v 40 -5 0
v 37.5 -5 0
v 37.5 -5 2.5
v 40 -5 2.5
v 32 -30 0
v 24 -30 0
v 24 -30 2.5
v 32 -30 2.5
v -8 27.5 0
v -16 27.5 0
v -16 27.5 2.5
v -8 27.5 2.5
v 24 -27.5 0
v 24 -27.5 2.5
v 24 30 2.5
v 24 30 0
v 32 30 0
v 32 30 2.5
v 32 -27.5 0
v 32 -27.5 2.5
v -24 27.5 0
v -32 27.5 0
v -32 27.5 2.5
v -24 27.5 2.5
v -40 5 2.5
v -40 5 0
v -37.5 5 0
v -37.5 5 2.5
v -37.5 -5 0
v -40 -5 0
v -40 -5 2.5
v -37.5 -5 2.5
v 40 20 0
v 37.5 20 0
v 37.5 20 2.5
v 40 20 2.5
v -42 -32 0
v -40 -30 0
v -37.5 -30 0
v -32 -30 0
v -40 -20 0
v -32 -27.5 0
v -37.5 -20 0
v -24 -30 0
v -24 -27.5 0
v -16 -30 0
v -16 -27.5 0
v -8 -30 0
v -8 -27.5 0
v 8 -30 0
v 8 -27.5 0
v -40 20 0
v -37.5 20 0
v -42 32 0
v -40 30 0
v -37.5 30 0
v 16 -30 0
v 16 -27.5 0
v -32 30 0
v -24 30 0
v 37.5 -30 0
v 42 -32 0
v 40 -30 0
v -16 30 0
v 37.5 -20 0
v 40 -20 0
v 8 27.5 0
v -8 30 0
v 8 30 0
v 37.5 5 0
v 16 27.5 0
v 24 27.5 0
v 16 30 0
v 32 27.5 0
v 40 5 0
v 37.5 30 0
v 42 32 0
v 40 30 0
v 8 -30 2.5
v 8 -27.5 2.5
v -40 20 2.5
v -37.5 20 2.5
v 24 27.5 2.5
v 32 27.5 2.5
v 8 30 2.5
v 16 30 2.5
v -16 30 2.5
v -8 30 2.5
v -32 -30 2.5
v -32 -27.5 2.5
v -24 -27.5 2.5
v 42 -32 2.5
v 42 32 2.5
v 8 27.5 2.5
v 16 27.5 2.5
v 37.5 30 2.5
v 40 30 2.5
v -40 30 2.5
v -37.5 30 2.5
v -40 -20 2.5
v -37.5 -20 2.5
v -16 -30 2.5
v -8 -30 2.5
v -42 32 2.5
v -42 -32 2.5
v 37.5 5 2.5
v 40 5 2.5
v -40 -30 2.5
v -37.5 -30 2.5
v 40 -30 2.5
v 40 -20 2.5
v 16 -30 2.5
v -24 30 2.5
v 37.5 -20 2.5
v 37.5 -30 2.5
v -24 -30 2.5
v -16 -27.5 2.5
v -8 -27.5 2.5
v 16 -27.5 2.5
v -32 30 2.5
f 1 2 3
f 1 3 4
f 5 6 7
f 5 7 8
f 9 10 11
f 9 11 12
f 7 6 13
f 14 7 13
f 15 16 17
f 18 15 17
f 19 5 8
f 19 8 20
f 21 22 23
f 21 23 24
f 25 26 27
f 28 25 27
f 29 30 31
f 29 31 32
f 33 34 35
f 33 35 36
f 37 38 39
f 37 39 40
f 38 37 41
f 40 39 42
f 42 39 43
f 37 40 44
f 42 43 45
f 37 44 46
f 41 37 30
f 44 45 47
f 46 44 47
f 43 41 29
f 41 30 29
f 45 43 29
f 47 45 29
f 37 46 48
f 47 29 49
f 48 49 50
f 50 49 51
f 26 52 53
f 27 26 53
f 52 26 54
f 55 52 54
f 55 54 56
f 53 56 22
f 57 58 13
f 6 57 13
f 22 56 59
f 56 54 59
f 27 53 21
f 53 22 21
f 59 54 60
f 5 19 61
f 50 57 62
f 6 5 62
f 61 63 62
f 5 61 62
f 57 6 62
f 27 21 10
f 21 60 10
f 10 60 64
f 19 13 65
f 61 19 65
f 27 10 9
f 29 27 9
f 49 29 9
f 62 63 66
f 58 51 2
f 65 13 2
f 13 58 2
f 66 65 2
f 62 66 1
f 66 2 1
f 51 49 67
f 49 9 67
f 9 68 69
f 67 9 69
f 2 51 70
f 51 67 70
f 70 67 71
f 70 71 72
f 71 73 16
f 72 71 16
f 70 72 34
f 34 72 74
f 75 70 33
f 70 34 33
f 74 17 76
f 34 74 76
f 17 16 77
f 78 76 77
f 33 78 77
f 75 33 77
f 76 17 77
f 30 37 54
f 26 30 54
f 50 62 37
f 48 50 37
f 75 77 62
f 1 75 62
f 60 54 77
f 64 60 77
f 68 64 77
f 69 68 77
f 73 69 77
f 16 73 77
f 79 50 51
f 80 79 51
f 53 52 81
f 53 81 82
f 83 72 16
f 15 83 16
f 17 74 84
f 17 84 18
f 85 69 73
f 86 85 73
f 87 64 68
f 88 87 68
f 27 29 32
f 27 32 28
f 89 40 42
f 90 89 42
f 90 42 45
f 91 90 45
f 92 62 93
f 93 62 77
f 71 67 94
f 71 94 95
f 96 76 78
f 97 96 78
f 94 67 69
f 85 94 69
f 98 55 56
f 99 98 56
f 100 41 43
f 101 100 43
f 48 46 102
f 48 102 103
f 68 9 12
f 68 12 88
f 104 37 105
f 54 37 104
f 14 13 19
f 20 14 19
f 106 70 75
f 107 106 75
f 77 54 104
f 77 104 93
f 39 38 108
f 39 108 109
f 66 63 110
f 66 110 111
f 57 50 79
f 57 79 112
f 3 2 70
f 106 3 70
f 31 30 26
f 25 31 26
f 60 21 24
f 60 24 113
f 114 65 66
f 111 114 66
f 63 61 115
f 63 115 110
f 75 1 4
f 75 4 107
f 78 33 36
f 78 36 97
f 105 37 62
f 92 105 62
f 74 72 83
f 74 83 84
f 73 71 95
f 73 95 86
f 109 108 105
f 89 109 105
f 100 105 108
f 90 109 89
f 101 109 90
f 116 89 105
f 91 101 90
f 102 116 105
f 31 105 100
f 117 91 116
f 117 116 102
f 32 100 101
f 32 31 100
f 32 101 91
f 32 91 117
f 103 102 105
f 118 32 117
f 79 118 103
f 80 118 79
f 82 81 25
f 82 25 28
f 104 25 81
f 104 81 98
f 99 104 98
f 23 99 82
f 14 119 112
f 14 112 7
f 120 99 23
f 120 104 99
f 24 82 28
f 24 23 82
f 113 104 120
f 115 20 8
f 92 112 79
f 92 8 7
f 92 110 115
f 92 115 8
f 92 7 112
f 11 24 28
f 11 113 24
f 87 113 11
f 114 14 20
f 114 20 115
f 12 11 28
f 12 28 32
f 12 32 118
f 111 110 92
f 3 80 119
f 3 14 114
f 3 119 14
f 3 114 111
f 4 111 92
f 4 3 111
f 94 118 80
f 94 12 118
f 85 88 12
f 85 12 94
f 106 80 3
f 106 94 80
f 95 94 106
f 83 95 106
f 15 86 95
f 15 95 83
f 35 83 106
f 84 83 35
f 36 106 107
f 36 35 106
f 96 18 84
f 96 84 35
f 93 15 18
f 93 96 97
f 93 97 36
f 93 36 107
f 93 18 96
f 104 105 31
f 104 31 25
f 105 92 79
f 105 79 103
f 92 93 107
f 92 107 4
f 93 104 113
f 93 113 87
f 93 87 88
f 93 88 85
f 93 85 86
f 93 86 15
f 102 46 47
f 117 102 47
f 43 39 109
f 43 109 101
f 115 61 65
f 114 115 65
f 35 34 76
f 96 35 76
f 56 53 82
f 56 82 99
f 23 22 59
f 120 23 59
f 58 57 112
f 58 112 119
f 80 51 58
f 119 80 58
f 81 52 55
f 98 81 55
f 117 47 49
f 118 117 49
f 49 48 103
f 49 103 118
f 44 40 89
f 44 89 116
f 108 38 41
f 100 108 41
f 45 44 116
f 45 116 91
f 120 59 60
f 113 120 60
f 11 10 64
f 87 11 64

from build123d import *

# Parameters (mm, degrees)
SKETCH1_W           = 84
SKETCH1_H           = 64
SKETCH1_W_2         = 8
SKETCH1_H_2         = 2.5
SKETCH1_W_3         = 2.5
SKETCH1_H_3         = 10
BOSS_EXTRUDE1_DEPTH = 2.5


with BuildPart() as part:
    # Sketch1 → Boss-Extrude1 (new body)
    with BuildSketch(Plane.XY):
        Rectangle(SKETCH1_W, SKETCH1_H)
        with Locations((-12, 28.75)):
            Rectangle(SKETCH1_W_2, SKETCH1_H_2, mode=Mode.SUBTRACT)
        with Locations((-28, 28.75)):
            Rectangle(SKETCH1_W_2, SKETCH1_H_2, mode=Mode.SUBTRACT)
        with Locations((-12, -28.75)):
            Rectangle(SKETCH1_W_2, SKETCH1_H_2, mode=Mode.SUBTRACT)
        with Locations((-28, -28.75)):
            Rectangle(SKETCH1_W_2, SKETCH1_H_2, mode=Mode.SUBTRACT)
        with Locations((-38.75, 0)):
            Rectangle(SKETCH1_W_3, SKETCH1_H_3, mode=Mode.SUBTRACT)
        with Locations((-38.75, 25)):
            Rectangle(SKETCH1_W_3, SKETCH1_H_3, mode=Mode.SUBTRACT)
        with Locations((-38.75, -25)):
            Rectangle(SKETCH1_W_3, SKETCH1_H_3, mode=Mode.SUBTRACT)
        with Locations((12, 28.75)):
            Rectangle(SKETCH1_W_2, SKETCH1_H_2, mode=Mode.SUBTRACT)
        with Locations((28, 28.75)):
            Rectangle(SKETCH1_W_2, SKETCH1_H_2, mode=Mode.SUBTRACT)
        with Locations((38.75, 25)):
            Rectangle(SKETCH1_W_3, SKETCH1_H_3, mode=Mode.SUBTRACT)
        with Locations((38.75, 0)):
            Rectangle(SKETCH1_W_3, SKETCH1_H_3, mode=Mode.SUBTRACT)
        with Locations((28, -28.75)):
            Rectangle(SKETCH1_W_2, SKETCH1_H_2, mode=Mode.SUBTRACT)
        with Locations((12, -28.75)):
            Rectangle(SKETCH1_W_2, SKETCH1_H_2, mode=Mode.SUBTRACT)
        with Locations((38.75, -25)):
            Rectangle(SKETCH1_W_3, SKETCH1_H_3, mode=Mode.SUBTRACT)
    extrude(amount=BOSS_EXTRUDE1_DEPTH)


solid = part.part
